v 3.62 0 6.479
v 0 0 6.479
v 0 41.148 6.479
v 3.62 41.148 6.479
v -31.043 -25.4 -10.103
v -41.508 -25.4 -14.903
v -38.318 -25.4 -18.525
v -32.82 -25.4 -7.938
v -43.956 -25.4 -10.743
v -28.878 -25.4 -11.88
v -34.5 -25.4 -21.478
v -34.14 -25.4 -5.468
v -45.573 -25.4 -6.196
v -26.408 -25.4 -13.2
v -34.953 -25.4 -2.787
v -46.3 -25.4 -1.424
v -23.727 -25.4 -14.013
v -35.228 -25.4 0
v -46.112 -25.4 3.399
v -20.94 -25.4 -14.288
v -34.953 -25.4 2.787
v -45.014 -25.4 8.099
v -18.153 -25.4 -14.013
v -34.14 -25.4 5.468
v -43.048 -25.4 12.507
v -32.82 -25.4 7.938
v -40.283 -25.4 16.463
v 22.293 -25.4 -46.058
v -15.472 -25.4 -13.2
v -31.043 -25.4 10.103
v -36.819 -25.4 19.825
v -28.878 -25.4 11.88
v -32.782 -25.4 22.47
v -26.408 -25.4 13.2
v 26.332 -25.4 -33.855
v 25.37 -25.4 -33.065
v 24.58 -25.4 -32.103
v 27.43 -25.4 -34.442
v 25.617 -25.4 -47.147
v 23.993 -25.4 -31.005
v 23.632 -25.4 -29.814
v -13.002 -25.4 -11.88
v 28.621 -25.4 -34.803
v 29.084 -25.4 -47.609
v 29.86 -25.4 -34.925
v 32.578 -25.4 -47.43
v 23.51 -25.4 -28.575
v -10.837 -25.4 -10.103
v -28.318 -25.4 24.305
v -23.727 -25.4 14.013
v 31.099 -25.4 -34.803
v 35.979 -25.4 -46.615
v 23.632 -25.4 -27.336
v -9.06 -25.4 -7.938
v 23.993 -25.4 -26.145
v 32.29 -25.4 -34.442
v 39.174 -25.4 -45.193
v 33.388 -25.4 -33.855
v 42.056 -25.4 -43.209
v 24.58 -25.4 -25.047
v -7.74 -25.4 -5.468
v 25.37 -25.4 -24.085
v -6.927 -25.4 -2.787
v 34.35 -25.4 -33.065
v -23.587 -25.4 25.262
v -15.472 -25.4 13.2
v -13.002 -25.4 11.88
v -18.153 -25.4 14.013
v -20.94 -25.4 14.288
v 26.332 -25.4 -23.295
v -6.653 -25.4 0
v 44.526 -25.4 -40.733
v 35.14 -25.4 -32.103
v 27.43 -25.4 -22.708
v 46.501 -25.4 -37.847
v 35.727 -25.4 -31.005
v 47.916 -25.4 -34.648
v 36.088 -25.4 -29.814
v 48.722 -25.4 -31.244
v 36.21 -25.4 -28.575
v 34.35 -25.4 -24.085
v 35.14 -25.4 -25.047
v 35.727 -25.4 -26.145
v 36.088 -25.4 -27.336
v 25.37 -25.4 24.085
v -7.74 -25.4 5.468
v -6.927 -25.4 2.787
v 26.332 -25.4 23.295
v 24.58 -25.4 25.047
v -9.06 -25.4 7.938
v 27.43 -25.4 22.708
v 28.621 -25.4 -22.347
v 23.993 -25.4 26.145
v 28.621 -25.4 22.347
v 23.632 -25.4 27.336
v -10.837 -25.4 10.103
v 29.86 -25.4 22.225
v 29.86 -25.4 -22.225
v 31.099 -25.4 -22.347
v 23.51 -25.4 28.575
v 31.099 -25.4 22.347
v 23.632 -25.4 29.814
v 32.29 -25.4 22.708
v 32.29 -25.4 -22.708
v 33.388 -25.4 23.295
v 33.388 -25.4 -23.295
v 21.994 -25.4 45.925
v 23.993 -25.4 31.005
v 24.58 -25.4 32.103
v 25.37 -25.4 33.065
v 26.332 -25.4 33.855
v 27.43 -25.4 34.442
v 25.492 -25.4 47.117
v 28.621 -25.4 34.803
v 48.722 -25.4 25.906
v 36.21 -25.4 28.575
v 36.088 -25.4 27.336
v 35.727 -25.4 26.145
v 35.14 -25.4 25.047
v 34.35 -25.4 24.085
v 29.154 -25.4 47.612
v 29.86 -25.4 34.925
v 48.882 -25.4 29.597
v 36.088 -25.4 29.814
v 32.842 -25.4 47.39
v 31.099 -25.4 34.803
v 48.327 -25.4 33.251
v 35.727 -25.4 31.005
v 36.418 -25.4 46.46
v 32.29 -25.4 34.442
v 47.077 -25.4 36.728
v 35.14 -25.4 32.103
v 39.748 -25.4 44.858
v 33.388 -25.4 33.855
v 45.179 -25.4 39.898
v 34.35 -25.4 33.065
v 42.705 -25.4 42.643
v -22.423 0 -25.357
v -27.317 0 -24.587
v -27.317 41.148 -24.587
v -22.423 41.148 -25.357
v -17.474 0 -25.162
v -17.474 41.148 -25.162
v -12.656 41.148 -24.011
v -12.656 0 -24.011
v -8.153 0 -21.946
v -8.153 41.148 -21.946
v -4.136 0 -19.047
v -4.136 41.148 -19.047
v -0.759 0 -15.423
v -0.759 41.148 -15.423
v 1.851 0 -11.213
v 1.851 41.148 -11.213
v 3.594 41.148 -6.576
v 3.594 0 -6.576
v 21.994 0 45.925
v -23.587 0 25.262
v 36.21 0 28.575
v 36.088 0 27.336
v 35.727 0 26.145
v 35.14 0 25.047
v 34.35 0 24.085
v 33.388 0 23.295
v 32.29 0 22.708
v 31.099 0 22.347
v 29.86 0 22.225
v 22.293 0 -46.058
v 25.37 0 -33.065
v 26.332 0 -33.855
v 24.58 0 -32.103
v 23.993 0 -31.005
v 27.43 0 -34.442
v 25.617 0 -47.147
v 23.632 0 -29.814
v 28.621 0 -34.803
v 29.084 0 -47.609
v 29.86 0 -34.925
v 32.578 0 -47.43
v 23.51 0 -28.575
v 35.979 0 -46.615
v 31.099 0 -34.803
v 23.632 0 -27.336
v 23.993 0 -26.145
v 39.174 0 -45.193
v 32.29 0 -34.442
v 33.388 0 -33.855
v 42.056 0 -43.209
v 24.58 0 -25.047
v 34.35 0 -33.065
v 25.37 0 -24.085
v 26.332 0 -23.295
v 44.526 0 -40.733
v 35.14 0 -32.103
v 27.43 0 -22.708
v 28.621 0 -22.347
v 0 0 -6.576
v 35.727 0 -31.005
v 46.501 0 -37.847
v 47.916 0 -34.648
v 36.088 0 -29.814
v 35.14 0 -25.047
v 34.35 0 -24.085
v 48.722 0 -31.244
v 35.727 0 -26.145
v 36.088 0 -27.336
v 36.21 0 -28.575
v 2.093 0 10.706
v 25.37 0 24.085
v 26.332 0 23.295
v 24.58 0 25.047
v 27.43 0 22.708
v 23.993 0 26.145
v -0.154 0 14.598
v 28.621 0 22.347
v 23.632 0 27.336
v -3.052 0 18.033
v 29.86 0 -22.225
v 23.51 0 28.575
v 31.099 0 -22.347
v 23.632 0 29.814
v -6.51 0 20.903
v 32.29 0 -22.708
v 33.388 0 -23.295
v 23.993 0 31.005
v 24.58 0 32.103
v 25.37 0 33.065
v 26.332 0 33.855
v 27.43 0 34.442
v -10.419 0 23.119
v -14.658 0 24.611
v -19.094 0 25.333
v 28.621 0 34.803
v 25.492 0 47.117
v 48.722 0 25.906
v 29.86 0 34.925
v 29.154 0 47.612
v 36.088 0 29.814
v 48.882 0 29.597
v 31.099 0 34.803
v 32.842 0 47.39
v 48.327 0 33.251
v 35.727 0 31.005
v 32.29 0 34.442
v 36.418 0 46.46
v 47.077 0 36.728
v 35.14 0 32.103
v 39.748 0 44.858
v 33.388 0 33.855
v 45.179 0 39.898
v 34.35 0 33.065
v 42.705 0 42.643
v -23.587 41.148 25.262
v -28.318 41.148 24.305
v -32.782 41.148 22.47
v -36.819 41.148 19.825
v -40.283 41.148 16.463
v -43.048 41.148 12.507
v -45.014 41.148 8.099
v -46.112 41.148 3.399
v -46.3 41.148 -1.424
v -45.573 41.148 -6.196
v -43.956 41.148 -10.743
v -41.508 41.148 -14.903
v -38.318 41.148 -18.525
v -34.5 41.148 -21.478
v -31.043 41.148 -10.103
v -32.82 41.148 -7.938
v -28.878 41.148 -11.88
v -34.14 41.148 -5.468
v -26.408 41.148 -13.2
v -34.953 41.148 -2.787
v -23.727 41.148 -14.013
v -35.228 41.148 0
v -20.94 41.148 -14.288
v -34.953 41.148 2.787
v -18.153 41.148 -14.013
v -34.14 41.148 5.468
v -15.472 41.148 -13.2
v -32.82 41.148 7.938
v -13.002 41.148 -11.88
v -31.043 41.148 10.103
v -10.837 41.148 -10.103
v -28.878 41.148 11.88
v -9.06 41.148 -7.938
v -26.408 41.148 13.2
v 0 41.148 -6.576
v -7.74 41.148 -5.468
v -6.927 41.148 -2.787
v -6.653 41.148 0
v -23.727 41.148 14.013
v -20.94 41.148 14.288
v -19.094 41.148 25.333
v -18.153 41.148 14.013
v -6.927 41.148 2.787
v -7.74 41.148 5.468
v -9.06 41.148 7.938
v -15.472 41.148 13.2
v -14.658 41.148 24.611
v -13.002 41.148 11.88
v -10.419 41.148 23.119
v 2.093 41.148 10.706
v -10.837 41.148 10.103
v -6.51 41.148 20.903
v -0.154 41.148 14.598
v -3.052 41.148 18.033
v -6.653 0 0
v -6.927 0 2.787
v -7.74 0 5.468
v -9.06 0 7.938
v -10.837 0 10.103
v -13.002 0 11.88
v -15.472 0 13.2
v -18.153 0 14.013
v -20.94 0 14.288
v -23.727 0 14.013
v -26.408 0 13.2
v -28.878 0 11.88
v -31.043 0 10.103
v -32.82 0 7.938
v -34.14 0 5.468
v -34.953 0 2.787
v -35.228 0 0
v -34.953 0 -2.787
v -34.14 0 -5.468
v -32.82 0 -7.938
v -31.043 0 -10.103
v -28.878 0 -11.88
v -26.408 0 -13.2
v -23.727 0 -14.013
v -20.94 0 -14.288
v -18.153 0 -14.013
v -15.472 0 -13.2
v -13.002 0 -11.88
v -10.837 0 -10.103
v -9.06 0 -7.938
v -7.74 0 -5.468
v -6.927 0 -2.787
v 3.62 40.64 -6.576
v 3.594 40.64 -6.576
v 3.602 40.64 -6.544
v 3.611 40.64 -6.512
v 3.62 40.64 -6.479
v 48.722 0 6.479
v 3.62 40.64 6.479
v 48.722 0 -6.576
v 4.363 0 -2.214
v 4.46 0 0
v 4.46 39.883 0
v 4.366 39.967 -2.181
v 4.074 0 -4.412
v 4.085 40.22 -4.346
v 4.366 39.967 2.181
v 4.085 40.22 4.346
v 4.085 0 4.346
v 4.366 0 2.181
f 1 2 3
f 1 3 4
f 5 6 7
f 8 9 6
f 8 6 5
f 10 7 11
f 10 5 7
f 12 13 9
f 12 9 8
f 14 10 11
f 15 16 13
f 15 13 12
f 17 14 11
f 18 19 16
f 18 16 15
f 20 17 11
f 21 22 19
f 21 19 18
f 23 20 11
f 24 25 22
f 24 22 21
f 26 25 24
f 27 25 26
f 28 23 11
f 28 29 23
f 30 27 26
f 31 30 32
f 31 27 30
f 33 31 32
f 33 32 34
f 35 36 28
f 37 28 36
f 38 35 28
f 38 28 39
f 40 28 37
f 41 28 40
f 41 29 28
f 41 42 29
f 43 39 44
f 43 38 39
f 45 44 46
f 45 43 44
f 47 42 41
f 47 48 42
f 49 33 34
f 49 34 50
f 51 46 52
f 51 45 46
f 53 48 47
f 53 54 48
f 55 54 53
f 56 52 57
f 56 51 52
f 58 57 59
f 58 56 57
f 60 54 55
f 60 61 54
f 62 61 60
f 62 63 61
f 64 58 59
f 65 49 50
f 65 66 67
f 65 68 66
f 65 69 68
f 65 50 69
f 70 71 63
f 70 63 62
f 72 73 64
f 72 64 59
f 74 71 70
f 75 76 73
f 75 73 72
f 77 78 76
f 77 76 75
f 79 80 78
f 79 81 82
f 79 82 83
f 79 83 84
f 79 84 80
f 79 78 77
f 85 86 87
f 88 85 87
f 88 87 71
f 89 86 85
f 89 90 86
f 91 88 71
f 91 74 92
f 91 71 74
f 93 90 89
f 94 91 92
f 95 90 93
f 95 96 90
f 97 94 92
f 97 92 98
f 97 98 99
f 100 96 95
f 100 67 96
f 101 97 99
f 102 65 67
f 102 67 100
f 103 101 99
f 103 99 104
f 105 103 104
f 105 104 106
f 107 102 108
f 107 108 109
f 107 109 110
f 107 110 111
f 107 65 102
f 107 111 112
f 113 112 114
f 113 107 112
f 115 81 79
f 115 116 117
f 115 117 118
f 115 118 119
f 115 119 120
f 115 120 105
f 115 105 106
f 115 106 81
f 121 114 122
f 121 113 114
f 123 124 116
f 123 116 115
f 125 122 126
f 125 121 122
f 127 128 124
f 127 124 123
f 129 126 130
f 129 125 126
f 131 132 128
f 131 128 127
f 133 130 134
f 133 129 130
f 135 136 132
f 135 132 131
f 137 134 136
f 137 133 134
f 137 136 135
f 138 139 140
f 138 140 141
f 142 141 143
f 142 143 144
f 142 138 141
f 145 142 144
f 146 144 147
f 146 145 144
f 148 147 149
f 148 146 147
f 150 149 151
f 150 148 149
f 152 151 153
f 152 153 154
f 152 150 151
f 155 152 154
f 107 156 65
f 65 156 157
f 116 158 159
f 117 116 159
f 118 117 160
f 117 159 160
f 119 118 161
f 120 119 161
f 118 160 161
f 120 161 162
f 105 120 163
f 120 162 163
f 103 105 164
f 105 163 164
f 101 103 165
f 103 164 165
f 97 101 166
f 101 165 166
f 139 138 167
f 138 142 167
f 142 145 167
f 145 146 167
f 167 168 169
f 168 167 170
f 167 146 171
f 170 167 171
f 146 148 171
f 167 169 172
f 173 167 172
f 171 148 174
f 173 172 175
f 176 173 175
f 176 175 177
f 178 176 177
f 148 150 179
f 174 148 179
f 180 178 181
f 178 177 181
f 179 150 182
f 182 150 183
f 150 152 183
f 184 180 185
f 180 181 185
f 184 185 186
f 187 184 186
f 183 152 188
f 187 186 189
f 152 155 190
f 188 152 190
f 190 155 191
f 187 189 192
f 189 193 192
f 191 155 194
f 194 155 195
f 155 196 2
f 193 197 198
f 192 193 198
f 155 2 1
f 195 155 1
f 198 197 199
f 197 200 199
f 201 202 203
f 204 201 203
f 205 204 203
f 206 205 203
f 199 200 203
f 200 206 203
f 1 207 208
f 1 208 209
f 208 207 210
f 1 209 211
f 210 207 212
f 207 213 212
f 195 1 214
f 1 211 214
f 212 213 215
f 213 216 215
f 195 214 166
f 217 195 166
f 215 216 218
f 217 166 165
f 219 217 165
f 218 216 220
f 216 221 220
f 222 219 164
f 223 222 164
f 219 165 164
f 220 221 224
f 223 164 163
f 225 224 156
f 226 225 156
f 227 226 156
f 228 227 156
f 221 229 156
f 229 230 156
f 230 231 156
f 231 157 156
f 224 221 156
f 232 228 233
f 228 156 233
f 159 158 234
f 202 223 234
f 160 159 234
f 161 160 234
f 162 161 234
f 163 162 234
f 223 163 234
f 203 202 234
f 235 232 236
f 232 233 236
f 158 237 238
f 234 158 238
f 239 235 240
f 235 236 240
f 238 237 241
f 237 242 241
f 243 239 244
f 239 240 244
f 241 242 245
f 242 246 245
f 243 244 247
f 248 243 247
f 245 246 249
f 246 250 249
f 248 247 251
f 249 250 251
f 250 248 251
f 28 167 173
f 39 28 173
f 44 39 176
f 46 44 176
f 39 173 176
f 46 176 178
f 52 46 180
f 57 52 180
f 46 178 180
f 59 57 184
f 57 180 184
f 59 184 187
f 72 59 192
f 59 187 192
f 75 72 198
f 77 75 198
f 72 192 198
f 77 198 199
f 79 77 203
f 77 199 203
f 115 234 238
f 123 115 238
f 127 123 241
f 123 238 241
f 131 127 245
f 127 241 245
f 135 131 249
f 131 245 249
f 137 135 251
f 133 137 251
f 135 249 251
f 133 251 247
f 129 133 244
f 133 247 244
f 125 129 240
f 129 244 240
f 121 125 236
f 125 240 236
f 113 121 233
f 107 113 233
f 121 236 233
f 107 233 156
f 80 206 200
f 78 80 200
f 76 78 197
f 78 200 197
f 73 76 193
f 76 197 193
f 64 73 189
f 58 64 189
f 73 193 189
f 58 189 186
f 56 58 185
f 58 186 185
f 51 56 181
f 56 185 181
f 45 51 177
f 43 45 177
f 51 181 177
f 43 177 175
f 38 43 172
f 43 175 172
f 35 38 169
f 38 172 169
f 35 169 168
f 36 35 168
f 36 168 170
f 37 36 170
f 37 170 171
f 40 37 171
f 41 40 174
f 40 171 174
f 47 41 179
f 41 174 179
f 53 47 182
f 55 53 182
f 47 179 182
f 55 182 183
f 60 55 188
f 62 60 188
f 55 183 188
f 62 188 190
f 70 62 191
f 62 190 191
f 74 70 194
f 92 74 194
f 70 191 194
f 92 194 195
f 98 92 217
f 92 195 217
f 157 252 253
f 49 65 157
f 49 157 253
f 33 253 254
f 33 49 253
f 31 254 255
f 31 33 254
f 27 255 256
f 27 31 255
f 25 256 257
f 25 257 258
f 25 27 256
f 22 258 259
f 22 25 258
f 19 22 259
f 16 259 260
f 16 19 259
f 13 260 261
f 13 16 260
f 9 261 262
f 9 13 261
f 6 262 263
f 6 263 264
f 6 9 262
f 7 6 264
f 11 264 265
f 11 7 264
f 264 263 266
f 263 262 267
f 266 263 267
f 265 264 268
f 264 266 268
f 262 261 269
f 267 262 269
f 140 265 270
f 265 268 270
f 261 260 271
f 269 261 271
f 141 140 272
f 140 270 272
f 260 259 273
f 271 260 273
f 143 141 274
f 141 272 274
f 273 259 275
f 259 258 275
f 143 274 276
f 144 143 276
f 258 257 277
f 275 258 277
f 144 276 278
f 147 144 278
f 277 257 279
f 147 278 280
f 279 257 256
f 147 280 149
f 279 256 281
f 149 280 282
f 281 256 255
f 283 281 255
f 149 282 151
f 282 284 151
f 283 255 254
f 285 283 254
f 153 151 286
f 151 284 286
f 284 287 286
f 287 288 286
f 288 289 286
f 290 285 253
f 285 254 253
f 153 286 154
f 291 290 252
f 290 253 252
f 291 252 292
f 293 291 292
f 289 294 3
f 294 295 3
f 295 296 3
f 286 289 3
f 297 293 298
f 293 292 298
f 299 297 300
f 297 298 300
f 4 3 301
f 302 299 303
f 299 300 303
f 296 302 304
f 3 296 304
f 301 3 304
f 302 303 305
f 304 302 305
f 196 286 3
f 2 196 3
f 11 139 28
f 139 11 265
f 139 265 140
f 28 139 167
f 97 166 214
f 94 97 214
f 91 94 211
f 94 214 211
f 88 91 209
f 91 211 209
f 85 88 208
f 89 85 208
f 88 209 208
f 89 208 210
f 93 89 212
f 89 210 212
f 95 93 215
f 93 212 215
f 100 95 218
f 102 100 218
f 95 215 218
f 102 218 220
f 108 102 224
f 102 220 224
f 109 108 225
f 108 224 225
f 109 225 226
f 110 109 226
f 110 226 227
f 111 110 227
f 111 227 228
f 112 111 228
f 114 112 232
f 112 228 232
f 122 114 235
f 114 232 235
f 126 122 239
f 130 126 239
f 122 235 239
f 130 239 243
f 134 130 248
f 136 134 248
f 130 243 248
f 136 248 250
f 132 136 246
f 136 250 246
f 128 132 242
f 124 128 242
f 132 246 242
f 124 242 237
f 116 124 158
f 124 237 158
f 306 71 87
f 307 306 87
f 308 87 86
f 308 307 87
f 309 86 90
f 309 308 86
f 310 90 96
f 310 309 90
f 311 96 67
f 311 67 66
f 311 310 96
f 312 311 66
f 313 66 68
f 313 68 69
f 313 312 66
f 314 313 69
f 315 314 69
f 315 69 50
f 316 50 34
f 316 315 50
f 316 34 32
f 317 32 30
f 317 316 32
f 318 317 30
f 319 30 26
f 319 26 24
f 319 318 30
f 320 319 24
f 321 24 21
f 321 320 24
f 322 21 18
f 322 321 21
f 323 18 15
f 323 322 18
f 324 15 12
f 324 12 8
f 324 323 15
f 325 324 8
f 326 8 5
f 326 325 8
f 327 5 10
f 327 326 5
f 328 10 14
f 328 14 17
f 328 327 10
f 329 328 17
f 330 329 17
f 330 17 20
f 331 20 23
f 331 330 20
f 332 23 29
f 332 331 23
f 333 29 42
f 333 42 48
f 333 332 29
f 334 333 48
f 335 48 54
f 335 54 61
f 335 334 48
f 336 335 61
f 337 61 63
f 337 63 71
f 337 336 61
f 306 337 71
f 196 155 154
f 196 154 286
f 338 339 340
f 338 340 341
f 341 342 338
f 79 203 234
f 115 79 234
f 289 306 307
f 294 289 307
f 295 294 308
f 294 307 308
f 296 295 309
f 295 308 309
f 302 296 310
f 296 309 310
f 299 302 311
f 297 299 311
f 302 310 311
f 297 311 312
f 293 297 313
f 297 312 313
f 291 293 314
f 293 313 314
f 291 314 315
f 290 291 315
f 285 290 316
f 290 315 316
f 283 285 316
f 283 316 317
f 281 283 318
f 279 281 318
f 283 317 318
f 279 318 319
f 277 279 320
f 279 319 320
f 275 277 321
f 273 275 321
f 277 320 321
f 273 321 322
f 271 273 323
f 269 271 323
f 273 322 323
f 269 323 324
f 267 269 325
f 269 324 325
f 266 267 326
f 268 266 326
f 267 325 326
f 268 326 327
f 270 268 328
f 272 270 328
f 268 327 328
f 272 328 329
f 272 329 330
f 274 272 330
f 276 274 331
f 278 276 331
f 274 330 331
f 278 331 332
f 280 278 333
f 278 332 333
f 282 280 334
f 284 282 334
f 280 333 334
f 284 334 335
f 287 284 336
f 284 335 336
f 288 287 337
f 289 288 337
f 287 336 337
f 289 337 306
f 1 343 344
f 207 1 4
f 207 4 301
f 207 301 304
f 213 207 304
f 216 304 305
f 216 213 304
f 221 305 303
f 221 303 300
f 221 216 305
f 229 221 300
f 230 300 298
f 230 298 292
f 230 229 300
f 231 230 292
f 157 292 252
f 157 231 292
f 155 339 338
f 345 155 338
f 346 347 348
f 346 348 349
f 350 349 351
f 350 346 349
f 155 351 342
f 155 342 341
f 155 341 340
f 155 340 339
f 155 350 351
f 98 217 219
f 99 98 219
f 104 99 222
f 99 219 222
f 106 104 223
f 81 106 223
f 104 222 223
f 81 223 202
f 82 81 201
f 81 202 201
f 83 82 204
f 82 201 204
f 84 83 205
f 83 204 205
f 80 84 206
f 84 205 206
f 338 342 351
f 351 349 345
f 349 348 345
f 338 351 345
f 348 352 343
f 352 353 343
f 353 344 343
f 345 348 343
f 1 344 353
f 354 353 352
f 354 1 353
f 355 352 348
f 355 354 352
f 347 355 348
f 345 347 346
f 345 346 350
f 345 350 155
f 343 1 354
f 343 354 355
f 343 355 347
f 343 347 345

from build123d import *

# Parameters (mm, degrees)
F0_R     = 14.2875
F1_DEPTH = 25.4
F2_DEPTH = 41.148
F3_DEPTH = 40.64
F5_DEPTH = 25.4


with BuildPart() as f1:
    # F0 (on Front) → F1 (new body)
    with BuildSketch(Plane.XZ):
        with BuildLine():
            Line((0, -6.5761469305), (0, 0))
            Line((0, 0), (0, 6.4793750644))
            Line((0, 6.4793750644), (3.6195983623, 6.4793750644))
            ThreePointArc((3.6195983623, 6.4793750644), (-6.5097266562, 20.9027501202), (-23.5870965608, 25.2616961481))
            ThreePointArc((-23.5870965608, 25.2616961481), (-45.6748305827, 5.7751199465), (-34.4999026403, -21.4776896658))
            Line((-34.4999026403, -21.4776896658), (-27.3168603147, -24.5865135025))
            ThreePointArc((-27.3168603147, -24.5865135025), (-8.1528212193, -21.9464362992), (3.5938637092, -6.5761469305))
            Line((3.5938637092, -6.5761469305), (0, -6.5761469305))
        make_face()
        with Locations((-20.9400779136, 0)):
            Circle(F0_R, mode=Mode.SUBTRACT)
        with BuildLine():
            Line((0, 6.4793750644), (0, 0))
            Line((0, 0), (4.4599220864, 0))
            ThreePointArc((4.4599220864, 0), (4.2489651152, 3.2668197527), (3.6195983623, 6.4793750644))
            Line((3.6195983623, 6.4793750644), (0, 6.4793750644))
        make_face()
        with BuildLine():
            Line((4.4599220864, 0), (0, 0))
            Line((0, 0), (0, -6.5761469305))
            Line((0, -6.5761469305), (3.5938637092, -6.5761469305))
            ThreePointArc((3.5938637092, -6.5761469305), (4.2424767346, -3.3164651952), (4.4599220864, 0))
        make_face()
        with BuildLine():
            Line((29.8599220864, 0), (4.4599220864, 0))
            ThreePointArc((4.4599220864, 0), (4.2424767346, -3.3164651952), (3.5938637092, -6.5761469305))
            Line((3.5938637092, -6.5761469305), (48.7220023626, -6.5761469305))
            Line((48.7220023626, -6.5761469305), (48.7220023626, 0))
            Line((48.7220023626, 0), (29.8599220864, 0))
        make_face()
        with BuildLine():
            ThreePointArc((3.6195983623, 6.4793750644), (4.2489651152, 3.2668197527), (4.4599220864, 0))
            Line((4.4599220864, 0), (29.8599220864, 0))
            Line((29.8599220864, 0), (48.7220023626, 0))
            Line((48.7220023626, 0), (48.7220023626, 6.4793750644))
            Line((48.7220023626, 6.4793750644), (3.6195983623, 6.4793750644))
        make_face()
        with BuildLine():
            Line((48.7220023626, -6.5761469305), (3.5938637092, -6.5761469305))
            ThreePointArc((3.5938637092, -6.5761469305), (-8.1528212193, -21.9464362992), (-27.3168603147, -24.5865135025))
            Line((-27.3168603147, -24.5865135025), (22.2933448748, -46.0578318444))
            ThreePointArc((22.2933448748, -46.0578318444), (39.1743355589, -45.1925871192), (48.7220023626, -31.2441623508))
            Line((48.7220023626, -31.2441623508), (48.7220023626, -25.9058376492))
            Line((48.7220023626, -25.9058376492), (48.7220023626, -6.5761469305))
        make_face()
        with BuildLine():
            ThreePointArc((29.8599220864, -22.225), (34.350050147, -24.0848719395), (36.2099220864, -28.575))
            ThreePointArc((36.2099220864, -28.575), (25.3697940259, -33.0651280605), (29.8599220864, -22.225))
        make_face(mode=Mode.SUBTRACT)
        with BuildLine():
            ThreePointArc((-23.5870965608, 25.2616961481), (-6.5097266562, 20.9027501202), (3.6195983623, 6.4793750644))
            Line((3.6195983623, 6.4793750644), (48.7220023626, 6.4793750644))
            Line((48.7220023626, 6.4793750644), (48.7220023626, 25.9058376492))
            ThreePointArc((48.7220023626, 25.9058376492), (41.2803657765, 43.8221625532), (21.9943834178, 45.9253833229))
            Line((21.9943834178, 45.9253833229), (-23.5870965608, 25.2616961481))
        make_face()
        with BuildLine():
            ThreePointArc((29.8599220864, 22.225), (25.3697940259, 33.0651280605), (36.2099220864, 28.575))
            ThreePointArc((36.2099220864, 28.575), (34.350050147, 24.0848719395), (29.8599220864, 22.225))
        make_face(mode=Mode.SUBTRACT)
    extrude(amount=F1_DEPTH)

    # F0 (on Front) → F2 (join)
    with BuildSketch(Plane.XZ):
        with BuildLine():
            Line((0, -6.5761469305), (0, 0))
            Line((0, 0), (0, 6.4793750644))
            Line((0, 6.4793750644), (3.6195983623, 6.4793750644))
            ThreePointArc((3.6195983623, 6.4793750644), (-6.5097266562, 20.9027501202), (-23.5870965608, 25.2616961481))
            ThreePointArc((-23.5870965608, 25.2616961481), (-45.6748305827, 5.7751199465), (-34.4999026403, -21.4776896658))
            Line((-34.4999026403, -21.4776896658), (-27.3168603147, -24.5865135025))
            ThreePointArc((-27.3168603147, -24.5865135025), (-8.1528212193, -21.9464362992), (3.5938637092, -6.5761469305))
            Line((3.5938637092, -6.5761469305), (0, -6.5761469305))
        make_face()
        with Locations((-20.9400779136, 0)):
            Circle(F0_R, mode=Mode.SUBTRACT)
    extrude(amount=-F2_DEPTH)


with BuildPart() as f3:
    # F0 (on Front) → F3 (new body)
    with BuildSketch(Plane.XZ):
        with BuildLine():
            Line((29.8599220864, 0), (4.4599220864, 0))
            ThreePointArc((4.4599220864, 0), (4.2424767346, -3.3164651952), (3.5938637092, -6.5761469305))
            Line((3.5938637092, -6.5761469305), (48.7220023626, -6.5761469305))
            Line((48.7220023626, -6.5761469305), (48.7220023626, 0))
            Line((48.7220023626, 0), (29.8599220864, 0))
        make_face()
        with BuildLine():
            ThreePointArc((3.6195983623, 6.4793750644), (4.2489651152, 3.2668197527), (4.4599220864, 0))
            Line((4.4599220864, 0), (29.8599220864, 0))
            Line((29.8599220864, 0), (48.7220023626, 0))
            Line((48.7220023626, 0), (48.7220023626, 6.4793750644))
            Line((48.7220023626, 6.4793750644), (3.6195983623, 6.4793750644))
        make_face()
    extrude(amount=-F3_DEPTH)

    # F4 (on face) → F5 (cut)
    with BuildSketch(Plane.XY.offset(6.4793750644)):
        Polygon((48.7220023626, 40.64), (3.6195983623, 40.64), (48.7220023626, 0), align=None)
    extrude(amount=-F5_DEPTH, mode=Mode.SUBTRACT)


solid = Compound([f1.part, f3.part])
